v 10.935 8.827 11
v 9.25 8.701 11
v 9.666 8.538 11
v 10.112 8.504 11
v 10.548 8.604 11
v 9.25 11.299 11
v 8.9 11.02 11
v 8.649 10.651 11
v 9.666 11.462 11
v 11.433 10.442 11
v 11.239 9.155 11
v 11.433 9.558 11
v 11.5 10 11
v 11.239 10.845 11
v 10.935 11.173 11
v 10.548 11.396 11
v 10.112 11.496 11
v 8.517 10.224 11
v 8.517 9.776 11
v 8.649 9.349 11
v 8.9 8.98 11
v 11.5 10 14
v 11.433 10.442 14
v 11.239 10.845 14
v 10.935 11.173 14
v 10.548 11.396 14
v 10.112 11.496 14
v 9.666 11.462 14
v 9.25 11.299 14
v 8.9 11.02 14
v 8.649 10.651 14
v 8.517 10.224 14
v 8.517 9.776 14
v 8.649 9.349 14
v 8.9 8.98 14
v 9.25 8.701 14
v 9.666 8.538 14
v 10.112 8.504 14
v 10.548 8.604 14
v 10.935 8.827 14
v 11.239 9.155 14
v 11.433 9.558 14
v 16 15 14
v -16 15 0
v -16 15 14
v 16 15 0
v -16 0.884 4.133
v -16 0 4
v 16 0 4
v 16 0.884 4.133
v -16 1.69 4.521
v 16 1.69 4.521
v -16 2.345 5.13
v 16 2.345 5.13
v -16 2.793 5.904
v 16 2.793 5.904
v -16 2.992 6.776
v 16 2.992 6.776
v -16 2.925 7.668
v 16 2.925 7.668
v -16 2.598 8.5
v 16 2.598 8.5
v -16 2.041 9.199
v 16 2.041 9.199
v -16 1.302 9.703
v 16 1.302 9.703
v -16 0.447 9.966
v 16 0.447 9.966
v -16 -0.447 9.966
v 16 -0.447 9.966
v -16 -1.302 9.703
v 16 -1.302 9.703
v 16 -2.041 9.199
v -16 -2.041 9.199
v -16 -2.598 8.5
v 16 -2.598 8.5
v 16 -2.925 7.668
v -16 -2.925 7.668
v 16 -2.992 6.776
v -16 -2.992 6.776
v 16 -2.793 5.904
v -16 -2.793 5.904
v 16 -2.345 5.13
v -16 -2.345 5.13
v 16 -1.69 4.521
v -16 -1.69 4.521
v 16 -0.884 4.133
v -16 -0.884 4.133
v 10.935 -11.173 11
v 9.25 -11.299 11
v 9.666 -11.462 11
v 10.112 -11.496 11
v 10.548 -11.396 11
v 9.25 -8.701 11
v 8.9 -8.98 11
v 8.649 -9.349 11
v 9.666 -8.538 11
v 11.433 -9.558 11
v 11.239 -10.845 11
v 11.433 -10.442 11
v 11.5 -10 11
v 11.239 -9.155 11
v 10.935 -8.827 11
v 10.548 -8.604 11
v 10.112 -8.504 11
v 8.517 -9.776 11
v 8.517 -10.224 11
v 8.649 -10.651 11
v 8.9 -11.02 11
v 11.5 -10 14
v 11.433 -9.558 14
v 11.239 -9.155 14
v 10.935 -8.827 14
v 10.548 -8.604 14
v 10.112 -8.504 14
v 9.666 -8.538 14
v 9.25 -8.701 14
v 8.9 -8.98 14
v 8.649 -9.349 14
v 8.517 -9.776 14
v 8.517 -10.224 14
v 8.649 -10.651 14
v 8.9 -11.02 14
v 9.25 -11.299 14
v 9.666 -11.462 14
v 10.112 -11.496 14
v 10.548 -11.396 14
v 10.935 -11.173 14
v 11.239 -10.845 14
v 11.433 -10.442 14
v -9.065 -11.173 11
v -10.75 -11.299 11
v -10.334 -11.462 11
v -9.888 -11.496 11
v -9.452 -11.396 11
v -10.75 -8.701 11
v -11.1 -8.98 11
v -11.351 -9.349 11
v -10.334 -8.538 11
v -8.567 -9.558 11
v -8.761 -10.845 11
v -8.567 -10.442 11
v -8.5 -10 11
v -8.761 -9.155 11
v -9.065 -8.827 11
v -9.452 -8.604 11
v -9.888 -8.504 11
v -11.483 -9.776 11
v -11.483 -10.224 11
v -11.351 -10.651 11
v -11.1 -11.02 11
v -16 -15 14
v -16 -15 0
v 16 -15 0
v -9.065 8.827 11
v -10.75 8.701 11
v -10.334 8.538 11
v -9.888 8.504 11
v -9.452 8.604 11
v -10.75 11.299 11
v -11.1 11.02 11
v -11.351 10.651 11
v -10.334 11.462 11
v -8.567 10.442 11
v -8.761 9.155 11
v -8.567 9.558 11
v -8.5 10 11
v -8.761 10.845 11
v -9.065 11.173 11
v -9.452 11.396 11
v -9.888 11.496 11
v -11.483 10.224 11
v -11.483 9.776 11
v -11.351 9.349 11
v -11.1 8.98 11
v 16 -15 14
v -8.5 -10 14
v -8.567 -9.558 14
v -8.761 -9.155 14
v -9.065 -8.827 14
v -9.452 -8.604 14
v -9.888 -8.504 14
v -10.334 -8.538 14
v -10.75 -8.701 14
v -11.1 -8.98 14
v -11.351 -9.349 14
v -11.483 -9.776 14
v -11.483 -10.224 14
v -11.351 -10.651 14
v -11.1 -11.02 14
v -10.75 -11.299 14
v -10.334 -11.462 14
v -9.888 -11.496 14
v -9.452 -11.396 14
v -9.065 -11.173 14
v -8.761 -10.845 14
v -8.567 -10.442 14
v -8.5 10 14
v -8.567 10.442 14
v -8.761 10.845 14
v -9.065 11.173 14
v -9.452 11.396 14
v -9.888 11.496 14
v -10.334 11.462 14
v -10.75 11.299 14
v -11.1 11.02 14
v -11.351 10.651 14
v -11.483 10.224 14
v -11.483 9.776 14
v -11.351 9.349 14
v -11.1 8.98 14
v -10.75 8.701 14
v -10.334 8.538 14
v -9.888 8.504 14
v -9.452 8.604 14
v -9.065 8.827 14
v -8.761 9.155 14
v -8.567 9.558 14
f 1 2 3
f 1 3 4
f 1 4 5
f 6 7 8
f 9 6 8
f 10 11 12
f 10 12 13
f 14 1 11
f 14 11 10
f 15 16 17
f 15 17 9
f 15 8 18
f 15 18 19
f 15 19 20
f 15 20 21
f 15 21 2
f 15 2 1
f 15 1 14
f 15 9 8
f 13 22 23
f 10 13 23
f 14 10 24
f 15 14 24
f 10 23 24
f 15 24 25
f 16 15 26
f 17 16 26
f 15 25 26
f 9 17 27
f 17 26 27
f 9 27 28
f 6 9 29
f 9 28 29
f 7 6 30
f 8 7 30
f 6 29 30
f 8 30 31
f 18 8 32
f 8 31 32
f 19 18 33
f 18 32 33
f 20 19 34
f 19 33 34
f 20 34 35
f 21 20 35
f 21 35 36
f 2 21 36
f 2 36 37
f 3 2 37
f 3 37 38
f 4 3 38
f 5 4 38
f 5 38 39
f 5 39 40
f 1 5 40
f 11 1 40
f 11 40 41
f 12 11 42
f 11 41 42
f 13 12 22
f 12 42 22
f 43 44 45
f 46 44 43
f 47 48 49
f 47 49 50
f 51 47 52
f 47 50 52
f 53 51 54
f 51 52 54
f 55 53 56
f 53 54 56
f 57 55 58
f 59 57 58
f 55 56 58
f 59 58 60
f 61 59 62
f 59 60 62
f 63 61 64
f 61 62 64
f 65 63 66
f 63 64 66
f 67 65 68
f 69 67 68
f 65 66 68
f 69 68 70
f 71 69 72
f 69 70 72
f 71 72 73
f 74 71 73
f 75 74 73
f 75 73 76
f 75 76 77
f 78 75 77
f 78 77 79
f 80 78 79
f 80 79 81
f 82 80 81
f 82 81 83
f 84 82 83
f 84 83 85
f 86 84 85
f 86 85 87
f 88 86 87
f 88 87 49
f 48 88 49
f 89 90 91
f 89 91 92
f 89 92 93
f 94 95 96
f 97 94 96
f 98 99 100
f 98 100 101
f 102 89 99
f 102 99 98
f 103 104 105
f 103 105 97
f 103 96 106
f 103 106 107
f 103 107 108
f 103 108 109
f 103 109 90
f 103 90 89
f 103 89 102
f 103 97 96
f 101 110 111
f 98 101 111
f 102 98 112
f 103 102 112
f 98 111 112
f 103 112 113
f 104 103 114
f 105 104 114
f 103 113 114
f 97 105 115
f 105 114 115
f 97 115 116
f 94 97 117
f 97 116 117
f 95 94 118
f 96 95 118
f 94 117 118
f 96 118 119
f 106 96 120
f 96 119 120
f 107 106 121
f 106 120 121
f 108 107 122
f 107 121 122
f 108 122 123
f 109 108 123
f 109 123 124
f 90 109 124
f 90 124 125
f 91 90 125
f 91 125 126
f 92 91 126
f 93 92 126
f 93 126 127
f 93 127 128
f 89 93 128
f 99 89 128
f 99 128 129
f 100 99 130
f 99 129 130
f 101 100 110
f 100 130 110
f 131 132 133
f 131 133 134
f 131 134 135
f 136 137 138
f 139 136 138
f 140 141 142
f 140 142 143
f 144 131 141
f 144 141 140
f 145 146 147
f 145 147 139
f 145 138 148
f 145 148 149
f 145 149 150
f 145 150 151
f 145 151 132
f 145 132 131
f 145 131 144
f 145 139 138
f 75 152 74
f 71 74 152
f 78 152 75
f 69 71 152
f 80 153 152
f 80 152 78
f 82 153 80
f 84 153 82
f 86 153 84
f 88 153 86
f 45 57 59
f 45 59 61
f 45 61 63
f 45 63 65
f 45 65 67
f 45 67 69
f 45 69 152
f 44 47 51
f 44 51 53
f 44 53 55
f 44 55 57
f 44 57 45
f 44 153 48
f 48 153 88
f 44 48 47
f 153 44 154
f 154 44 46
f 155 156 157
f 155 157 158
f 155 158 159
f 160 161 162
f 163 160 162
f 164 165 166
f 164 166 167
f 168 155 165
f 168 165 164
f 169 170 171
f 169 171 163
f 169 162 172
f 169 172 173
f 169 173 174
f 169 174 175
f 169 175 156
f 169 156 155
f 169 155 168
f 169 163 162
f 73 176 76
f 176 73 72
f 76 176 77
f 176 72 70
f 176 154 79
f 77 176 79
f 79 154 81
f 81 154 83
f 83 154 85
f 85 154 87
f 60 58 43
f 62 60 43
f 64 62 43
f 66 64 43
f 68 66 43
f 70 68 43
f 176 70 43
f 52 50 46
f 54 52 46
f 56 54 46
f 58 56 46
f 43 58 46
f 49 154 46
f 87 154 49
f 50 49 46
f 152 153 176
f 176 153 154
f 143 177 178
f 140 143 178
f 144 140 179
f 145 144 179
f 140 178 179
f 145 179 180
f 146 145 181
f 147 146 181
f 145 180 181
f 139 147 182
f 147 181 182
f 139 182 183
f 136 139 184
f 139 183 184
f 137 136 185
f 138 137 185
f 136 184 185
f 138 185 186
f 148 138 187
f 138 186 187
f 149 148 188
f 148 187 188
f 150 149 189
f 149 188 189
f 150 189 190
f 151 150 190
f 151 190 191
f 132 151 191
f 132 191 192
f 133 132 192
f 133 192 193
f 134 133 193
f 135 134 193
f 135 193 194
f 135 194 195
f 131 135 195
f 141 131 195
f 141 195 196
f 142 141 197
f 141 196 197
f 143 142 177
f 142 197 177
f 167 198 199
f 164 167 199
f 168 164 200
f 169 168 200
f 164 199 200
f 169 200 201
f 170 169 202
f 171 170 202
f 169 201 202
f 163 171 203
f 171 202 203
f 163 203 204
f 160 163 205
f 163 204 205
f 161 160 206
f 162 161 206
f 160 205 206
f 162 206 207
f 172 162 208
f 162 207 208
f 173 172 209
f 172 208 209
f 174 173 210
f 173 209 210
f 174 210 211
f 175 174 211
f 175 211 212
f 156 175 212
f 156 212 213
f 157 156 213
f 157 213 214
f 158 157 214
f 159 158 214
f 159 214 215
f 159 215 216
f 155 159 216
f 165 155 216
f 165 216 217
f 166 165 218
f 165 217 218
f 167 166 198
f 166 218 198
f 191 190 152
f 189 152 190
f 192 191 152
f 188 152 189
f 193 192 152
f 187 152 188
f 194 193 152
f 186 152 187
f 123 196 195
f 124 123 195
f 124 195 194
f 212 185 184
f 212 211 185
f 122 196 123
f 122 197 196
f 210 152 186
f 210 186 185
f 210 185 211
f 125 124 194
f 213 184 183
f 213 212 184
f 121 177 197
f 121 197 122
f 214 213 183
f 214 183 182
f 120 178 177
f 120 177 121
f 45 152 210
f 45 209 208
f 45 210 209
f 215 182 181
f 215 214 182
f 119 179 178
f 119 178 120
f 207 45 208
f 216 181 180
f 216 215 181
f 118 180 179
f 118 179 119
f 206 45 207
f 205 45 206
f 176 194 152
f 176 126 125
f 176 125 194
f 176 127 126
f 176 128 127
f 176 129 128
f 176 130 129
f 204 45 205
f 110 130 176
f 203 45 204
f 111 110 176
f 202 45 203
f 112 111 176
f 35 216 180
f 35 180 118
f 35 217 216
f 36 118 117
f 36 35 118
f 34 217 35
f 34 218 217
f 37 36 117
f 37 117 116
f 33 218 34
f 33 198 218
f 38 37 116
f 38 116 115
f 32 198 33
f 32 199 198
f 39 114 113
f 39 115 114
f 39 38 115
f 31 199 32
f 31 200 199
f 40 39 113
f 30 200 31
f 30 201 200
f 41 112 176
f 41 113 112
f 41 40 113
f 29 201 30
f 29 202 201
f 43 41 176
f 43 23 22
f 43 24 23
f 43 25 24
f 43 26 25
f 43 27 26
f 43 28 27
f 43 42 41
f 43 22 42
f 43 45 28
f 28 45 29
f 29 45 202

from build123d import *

# Parameters (mm, degrees)
SKETCH_1_W          = 32
SKETCH_1_H          = 30
EXTRUDE_1_DEPTH     = 14
SKETCH_2_R          = 3
CUT_EXTRUDE_1_DEPTH = 33
SKETCH_3_R          = 1.5
CUT_EXTRUDE_2_DEPTH = 3


with BuildPart() as part:
    # 草图1 → 凸台-拉伸1 (new body)
    with BuildSketch(Plane.XY):
        Rectangle(SKETCH_1_W, SKETCH_1_H)
    extrude(amount=EXTRUDE_1_DEPTH)

    # 草图2 → 切除-拉伸1 (cut)
    with BuildSketch(Plane(origin=(16, 0, 0), x_dir=(0, 0, -1), z_dir=(1, 0, 0))):
        with Locations((-7, 0)):
            Circle(SKETCH_2_R)
    extrude(amount=-CUT_EXTRUDE_1_DEPTH, mode=Mode.SUBTRACT)

    # 草图3 → 切除-拉伸2 (cut)
    with BuildSketch(Plane.XY.offset(14)):
        with Locations((-10, 10)):
            Circle(SKETCH_3_R)
        with Locations((10, 10)):
            Circle(SKETCH_3_R)
        with Locations((10, -10)):
            Circle(SKETCH_3_R)
        with Locations((-10, -10)):
            Circle(SKETCH_3_R)
    extrude(amount=-CUT_EXTRUDE_2_DEPTH, mode=Mode.SUBTRACT)


solid = part.part
